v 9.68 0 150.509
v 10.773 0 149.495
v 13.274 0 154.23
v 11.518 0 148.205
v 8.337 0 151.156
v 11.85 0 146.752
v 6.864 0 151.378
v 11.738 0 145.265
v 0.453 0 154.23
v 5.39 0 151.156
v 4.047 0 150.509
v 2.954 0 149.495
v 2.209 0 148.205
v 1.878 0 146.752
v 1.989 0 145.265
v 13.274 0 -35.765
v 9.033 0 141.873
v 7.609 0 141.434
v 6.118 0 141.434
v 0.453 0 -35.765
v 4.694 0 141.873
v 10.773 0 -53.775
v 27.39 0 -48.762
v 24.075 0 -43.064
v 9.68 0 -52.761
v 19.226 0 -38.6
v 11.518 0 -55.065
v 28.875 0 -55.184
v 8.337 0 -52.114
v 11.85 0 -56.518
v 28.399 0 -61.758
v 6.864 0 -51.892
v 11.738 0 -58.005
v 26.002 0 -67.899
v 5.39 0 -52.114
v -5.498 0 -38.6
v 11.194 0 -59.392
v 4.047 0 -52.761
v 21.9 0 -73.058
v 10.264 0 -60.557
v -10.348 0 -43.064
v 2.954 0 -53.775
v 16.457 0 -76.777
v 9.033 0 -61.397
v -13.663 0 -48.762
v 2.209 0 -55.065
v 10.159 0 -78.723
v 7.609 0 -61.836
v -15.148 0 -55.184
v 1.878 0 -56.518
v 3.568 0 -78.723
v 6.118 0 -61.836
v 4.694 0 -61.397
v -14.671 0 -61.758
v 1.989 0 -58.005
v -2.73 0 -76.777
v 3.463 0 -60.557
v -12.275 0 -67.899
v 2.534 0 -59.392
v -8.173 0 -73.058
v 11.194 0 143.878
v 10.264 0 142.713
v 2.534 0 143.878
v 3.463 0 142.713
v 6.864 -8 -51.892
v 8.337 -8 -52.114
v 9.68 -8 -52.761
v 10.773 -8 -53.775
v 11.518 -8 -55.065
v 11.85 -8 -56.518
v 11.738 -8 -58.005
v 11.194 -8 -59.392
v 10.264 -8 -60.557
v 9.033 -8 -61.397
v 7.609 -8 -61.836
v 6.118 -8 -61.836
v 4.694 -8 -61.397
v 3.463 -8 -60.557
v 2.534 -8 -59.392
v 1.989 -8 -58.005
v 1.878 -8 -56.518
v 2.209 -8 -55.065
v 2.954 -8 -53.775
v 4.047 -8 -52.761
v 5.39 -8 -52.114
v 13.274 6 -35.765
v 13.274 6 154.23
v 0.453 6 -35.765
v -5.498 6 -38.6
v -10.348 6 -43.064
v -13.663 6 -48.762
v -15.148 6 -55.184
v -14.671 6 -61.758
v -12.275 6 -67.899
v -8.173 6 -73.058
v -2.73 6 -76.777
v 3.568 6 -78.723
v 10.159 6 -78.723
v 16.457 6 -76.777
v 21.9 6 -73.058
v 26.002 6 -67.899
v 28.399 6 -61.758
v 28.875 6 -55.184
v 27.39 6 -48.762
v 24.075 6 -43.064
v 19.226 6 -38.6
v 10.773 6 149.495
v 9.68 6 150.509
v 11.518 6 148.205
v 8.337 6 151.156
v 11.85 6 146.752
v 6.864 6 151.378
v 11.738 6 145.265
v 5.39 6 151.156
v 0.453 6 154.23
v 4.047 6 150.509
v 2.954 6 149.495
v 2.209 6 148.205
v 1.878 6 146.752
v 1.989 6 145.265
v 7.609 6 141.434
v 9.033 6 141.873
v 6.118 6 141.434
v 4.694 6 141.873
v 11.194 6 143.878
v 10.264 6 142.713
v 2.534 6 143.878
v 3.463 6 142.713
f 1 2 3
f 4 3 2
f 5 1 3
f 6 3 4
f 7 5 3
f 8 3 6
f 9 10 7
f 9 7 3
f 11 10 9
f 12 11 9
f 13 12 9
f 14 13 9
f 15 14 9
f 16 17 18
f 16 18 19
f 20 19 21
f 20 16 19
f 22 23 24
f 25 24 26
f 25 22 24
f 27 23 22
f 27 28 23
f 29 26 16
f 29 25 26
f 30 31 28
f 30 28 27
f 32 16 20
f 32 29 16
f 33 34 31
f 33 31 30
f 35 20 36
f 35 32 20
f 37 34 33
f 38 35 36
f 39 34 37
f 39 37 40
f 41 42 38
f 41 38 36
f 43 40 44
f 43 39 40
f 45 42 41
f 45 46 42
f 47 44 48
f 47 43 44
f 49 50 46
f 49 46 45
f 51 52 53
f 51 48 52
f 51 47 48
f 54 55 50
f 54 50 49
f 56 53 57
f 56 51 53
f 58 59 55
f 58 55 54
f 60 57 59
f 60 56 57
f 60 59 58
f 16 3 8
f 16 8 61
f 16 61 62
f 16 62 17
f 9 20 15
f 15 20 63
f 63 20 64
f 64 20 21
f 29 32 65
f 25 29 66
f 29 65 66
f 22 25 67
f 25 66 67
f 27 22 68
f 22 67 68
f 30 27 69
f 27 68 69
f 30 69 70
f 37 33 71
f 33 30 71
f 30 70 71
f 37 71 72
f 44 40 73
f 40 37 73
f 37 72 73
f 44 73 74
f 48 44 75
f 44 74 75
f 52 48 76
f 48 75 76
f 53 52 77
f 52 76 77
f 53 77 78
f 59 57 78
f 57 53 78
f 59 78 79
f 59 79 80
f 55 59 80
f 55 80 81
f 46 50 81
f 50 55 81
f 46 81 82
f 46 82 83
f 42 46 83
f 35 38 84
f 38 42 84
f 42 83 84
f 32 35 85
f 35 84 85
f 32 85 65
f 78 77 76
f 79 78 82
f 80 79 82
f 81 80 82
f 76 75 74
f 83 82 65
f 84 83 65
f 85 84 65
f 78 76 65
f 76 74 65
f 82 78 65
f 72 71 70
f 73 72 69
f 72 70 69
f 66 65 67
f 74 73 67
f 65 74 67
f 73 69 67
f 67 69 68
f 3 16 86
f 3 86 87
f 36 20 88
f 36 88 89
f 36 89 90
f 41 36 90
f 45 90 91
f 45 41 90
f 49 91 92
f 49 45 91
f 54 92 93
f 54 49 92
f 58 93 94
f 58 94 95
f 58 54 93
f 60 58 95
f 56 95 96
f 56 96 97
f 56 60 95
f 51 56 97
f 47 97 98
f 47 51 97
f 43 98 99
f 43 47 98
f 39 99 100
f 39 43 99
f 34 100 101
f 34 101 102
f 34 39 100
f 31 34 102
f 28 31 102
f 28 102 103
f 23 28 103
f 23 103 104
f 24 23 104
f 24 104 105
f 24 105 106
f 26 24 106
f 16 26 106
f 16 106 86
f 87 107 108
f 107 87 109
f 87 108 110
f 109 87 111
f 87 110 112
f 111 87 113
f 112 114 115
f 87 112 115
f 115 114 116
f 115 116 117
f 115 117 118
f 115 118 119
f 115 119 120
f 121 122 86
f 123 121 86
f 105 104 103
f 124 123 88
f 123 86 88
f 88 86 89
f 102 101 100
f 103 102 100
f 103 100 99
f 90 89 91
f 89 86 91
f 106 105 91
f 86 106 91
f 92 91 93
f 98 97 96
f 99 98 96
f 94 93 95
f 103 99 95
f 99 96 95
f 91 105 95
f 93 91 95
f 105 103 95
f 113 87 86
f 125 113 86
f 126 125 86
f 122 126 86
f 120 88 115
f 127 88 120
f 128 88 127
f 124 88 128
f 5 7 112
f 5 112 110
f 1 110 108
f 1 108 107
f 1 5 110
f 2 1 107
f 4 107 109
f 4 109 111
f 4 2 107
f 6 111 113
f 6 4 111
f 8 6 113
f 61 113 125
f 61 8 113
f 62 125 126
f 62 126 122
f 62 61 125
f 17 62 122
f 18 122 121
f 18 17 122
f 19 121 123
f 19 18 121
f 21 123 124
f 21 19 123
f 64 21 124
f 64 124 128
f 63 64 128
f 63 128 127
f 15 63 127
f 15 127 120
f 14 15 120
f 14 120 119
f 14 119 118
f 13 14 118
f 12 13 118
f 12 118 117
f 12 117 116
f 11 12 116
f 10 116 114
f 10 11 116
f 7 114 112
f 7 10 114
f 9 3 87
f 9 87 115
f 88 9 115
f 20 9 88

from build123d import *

# Parameters (mm, degrees)
SKETCH2_R           = 5
BOSS_EXTRUDE1_DEPTH = 6
BOSS_EXTRUDE2_START = -14
SKETCH3_R           = 5
BOSS_EXTRUDE2_DEPTH = 14


with BuildPart() as part:
    # Sketch2 → Boss-Extrude1 (new body)
    with BuildSketch(Plane(origin=(0, 0, 0), x_dir=(1, 0, 0), z_dir=(0, 1, 0))):
        with BuildLine():
            Line((13.274432238, 35.765352266), (13.274432238, -125.251116332))
            Line((13.274432238, -125.251116332), (13.274432238, -154.229901261))
            Line((13.274432238, -154.229901261), (0.452829748, -154.229901261))
            Line((0.452829748, -154.229901261), (0.452829748, -125.251116332))
            Line((0.452829748, -125.251116332), (0.452829748, 35.765352266))
            ThreePointArc((0.452829748, 35.765352266), (6.863630993, 78.970129688), (13.274432238, 35.765352266))
        make_face()
        with Locations(Location((6.863630993, 56.892117967, 0), (0, 0, 90))):
            Circle(SKETCH2_R, mode=Mode.SUBTRACT)
        with Locations(Location((6.863630993, -146.377882033, 0), (0, 0, 270))):
            Circle(SKETCH2_R, mode=Mode.SUBTRACT)
    extrude(amount=BOSS_EXTRUDE1_DEPTH)

    # Sketch3 → Boss-Extrude2 (add)
    with BuildSketch(Plane(origin=(0, 6, 0), x_dir=(1, 0, 0), z_dir=(0, 1, 0)).offset(BOSS_EXTRUDE2_START)):
        with Locations(Location((6.863630993, 56.892117967, 0), (0, 0, 270))):
            Circle(SKETCH3_R)
    extrude(amount=BOSS_EXTRUDE2_DEPTH)


solid = part.part
